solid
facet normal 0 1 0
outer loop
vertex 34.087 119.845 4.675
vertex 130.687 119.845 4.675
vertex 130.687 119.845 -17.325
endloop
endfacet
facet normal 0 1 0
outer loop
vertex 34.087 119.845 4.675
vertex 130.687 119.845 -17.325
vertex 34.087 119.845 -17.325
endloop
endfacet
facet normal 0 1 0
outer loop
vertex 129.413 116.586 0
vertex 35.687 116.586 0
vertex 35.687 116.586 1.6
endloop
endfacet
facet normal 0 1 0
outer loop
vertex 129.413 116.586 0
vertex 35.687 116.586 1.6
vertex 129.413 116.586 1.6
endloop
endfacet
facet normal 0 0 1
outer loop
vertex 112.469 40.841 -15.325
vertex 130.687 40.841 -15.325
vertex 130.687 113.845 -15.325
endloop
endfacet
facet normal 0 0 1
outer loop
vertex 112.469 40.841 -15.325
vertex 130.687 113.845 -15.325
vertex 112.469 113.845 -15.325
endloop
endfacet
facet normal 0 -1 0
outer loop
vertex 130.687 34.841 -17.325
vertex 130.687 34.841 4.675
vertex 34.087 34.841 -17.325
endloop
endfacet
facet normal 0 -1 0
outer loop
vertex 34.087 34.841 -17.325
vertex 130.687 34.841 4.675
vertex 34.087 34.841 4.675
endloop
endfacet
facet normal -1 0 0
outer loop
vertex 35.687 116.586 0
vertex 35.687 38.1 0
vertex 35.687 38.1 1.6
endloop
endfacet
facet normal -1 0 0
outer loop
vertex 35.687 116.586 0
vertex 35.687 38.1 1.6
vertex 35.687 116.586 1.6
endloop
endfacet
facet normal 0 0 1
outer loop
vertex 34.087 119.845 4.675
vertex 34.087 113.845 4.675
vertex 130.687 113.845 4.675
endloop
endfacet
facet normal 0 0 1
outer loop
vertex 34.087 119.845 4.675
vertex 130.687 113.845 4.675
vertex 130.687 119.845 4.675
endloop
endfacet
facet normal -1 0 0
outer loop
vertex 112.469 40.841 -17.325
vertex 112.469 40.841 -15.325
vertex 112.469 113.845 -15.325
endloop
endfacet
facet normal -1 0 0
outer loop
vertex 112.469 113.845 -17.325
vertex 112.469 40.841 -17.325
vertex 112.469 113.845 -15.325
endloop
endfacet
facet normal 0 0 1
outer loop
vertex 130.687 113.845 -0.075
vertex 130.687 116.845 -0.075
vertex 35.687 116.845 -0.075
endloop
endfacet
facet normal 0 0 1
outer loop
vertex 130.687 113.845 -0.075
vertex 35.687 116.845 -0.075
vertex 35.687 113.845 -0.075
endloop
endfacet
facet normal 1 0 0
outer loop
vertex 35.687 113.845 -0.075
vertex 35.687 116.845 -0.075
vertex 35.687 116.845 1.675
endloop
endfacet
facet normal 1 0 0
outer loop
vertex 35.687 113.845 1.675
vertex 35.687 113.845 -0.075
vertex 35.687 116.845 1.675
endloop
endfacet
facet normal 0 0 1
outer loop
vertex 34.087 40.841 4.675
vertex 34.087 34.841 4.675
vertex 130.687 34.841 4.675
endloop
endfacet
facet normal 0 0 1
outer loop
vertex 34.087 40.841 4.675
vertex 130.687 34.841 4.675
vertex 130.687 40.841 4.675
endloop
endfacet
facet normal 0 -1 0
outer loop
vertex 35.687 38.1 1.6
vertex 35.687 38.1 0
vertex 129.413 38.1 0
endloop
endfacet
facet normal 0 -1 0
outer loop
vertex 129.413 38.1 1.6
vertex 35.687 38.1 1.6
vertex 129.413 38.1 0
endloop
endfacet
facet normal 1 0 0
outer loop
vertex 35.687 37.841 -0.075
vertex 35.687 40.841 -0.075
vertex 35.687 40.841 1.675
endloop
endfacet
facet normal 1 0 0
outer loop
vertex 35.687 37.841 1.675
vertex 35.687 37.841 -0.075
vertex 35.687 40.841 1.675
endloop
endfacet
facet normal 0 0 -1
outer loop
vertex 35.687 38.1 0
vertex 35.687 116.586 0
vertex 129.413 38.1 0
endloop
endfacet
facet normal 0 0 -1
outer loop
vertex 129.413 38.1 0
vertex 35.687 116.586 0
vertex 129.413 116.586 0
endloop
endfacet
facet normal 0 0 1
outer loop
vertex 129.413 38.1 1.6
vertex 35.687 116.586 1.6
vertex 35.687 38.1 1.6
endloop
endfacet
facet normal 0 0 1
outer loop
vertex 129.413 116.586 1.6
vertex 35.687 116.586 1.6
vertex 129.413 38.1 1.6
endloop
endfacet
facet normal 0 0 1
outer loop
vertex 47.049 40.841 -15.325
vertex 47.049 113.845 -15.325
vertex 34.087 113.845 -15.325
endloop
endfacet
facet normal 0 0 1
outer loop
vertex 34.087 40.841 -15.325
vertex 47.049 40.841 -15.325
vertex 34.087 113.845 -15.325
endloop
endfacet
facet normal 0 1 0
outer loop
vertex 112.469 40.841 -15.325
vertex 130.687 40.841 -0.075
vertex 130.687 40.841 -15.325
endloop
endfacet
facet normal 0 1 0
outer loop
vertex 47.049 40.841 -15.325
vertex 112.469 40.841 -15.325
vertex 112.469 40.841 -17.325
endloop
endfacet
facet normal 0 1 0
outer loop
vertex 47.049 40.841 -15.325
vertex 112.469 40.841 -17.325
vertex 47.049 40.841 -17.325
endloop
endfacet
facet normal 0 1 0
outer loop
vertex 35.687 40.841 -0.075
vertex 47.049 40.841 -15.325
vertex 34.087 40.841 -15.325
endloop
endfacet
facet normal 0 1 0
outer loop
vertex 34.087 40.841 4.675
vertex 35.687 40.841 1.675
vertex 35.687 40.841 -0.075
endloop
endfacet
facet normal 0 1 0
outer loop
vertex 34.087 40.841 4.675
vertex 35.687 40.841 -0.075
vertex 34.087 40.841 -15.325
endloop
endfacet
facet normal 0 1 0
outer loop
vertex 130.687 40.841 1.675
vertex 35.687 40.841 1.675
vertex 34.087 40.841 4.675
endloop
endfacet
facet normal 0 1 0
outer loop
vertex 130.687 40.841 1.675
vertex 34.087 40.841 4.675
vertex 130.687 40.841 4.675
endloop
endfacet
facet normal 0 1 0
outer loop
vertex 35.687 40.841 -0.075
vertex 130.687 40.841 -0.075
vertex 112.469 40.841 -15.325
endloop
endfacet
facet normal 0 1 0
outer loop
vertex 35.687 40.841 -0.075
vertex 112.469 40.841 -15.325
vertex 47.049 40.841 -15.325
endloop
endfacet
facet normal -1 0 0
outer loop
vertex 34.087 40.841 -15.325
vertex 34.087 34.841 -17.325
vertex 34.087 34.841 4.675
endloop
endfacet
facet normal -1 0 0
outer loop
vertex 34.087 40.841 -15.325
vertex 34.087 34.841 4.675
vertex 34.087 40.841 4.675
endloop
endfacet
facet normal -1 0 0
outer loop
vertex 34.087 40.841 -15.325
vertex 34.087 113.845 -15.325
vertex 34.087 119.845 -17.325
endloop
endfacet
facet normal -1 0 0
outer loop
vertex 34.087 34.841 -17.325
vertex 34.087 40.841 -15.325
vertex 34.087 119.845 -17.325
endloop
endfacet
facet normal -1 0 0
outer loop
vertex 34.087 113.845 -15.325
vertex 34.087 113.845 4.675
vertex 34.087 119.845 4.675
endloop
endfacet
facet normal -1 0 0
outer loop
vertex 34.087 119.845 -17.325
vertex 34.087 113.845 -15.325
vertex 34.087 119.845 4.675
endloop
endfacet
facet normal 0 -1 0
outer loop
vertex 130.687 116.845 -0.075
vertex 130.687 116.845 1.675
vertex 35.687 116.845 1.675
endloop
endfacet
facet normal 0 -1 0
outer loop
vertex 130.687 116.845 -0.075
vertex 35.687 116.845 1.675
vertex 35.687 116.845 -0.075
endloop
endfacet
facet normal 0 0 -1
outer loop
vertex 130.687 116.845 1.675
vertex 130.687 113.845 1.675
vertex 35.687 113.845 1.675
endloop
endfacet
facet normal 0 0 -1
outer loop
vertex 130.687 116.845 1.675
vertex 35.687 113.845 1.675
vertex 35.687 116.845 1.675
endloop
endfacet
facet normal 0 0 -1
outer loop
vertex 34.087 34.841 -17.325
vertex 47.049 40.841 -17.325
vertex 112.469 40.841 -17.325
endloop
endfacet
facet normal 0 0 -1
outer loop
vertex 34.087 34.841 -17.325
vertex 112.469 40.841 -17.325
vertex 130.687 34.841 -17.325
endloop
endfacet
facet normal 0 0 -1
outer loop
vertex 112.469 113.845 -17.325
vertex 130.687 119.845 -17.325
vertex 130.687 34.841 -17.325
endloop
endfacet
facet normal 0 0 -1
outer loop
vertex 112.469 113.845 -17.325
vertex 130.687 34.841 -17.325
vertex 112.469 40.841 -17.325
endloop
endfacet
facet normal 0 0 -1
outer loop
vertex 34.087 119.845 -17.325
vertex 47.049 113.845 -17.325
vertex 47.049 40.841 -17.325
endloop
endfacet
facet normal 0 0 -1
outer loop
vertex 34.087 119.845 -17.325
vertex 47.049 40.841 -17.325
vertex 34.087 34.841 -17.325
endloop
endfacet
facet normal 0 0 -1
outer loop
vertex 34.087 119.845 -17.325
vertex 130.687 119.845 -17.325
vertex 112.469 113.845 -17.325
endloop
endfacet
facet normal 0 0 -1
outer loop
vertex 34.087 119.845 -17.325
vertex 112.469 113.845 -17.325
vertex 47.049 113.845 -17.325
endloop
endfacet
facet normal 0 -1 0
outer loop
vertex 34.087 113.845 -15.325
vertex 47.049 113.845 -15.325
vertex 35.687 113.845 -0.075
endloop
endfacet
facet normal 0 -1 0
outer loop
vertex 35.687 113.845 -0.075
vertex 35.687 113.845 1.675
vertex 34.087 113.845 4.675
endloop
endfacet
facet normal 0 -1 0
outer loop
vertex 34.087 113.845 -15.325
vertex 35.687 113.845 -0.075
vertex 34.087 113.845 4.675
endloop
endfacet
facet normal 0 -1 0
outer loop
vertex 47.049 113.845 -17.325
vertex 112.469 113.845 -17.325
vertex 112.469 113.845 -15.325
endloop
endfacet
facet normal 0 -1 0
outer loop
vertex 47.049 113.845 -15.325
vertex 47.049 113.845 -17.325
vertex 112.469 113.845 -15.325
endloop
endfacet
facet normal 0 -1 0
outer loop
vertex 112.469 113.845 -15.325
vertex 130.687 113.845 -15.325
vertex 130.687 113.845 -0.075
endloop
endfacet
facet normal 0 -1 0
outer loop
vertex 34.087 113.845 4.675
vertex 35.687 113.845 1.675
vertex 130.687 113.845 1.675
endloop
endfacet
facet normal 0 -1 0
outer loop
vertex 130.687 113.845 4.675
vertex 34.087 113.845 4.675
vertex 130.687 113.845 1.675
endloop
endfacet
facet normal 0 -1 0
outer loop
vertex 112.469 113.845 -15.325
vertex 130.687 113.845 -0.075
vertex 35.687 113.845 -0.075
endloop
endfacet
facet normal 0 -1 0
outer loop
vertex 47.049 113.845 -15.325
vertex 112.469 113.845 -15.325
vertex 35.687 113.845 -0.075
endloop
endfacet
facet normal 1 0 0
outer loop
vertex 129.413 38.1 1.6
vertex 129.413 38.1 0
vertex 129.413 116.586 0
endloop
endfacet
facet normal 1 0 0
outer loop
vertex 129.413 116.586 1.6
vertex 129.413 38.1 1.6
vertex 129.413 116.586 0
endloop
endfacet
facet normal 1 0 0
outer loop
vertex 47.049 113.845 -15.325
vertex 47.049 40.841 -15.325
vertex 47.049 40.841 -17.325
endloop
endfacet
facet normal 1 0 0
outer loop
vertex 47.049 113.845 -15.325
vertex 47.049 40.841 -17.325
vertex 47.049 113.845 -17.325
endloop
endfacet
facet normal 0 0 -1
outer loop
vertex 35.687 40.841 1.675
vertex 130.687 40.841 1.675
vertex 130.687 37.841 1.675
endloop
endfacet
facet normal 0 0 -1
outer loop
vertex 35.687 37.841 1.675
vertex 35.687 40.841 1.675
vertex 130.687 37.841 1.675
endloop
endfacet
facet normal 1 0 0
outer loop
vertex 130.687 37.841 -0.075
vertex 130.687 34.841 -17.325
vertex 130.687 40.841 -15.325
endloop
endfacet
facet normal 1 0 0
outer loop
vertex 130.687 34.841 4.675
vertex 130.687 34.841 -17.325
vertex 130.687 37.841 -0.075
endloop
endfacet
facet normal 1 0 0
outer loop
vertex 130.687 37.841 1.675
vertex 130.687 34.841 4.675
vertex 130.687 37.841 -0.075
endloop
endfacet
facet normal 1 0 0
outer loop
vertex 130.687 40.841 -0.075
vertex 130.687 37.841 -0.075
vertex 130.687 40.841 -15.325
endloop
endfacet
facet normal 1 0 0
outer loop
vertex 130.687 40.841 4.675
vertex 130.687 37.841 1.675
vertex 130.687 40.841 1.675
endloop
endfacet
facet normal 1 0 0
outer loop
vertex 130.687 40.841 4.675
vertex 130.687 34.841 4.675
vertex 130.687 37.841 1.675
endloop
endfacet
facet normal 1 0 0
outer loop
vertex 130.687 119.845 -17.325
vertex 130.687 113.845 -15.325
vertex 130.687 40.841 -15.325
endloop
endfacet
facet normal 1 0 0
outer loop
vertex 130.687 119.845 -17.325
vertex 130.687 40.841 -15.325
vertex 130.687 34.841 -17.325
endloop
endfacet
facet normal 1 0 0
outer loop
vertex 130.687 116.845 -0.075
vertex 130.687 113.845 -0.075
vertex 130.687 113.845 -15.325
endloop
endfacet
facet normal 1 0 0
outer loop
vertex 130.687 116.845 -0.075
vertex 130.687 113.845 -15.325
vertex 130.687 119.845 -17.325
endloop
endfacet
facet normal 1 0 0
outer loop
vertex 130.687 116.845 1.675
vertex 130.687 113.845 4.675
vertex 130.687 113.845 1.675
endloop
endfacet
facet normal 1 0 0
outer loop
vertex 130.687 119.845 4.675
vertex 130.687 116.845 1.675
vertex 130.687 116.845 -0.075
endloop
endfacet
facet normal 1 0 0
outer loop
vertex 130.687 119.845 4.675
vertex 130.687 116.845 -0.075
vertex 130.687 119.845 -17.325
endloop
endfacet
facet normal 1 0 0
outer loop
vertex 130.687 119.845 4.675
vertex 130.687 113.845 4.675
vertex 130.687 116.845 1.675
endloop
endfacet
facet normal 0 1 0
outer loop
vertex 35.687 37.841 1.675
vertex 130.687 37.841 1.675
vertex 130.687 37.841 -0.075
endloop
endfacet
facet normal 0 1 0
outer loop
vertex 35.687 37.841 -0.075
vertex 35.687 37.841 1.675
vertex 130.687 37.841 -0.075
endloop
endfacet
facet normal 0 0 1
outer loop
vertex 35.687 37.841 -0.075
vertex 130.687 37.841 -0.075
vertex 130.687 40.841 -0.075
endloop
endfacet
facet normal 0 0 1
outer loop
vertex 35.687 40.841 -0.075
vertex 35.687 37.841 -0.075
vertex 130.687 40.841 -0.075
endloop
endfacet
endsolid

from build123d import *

# Parameters (mm, degrees)
SKETCH4_W             = 93.726
SKETCH4_H             = 78.486
BOSS_EXTRUDE1_DEPTH   = 1.6
BOSS_EXTRUDE2_DEPTH   = 95
BOSS_EXTRUDE2_2_DEPTH = 95
SKETCH6_W             = 20
SKETCH6_H             = 6
BOSS_EXTRUDE3_DEPTH   = 1.6
SKETCH7_W             = 96.6
SKETCH7_H             = 85.004960342
SKETCH7_W_2           = 65.419983822
SKETCH7_H_2           = 73.004960342
BOSS_EXTRUDE4_DEPTH   = 2


with BuildPart() as part:
    # Sketch4 → Boss-Extrude1 (new body)
    with BuildSketch(Plane.XY):
        with Locations((82.55, 77.343)):
            Rectangle(SKETCH4_W, SKETCH4_H)
    extrude(amount=BOSS_EXTRUDE1_DEPTH)


with BuildPart() as body_2:
    # Sketch5 → Boss-Extrude2 (new body)
    with BuildSketch(Plane.ZY.offset(-35.687)):
        Polygon((-0.075, 113.845480171), (-15.325, 113.845480171), (-15.325, 119.845480171), (4.675, 119.845480171), (4.675, 113.845480171), (1.675, 113.845480171), (1.675, 116.845480171), (-0.075, 116.845480171), align=None)
    extrude(amount=-BOSS_EXTRUDE2_DEPTH)

    # Sketch6 → Boss-Extrude3 (add)
    with BuildSketch(Plane.ZY.offset(-35.687)):
        with Locations((-5.325, 116.845480171)):
            Rectangle(SKETCH6_W, SKETCH6_H)
        with Locations((-5.325, 37.840519829)):
            Rectangle(SKETCH6_W, SKETCH6_H)
    extrude(amount=BOSS_EXTRUDE3_DEPTH)


with BuildPart() as body_3:
    # Sketch5 → Boss-Extrude2 2 (new body)
    with BuildSketch(Plane.ZY.offset(-35.687)):
        Polygon((-0.075, 37.840519829), (-0.075, 40.840519829), (-15.325, 40.840519829), (-15.325, 34.840519829), (4.675, 34.840519829), (4.675, 40.840519829), (1.675, 40.840519829), (1.675, 37.840519829), align=None)
    extrude(amount=-BOSS_EXTRUDE2_2_DEPTH)


with BuildPart() as boss_extrude3_piece_1:
    # of the separate pieces the step leaves, piece 1, a body of its own (boss_extrude3_pieces)
    add(body_2.part.solids().sort_by_distance((35.687, 113.845480171, -0.075))[0])

    # Sketch7 → Boss-Extrude4 (add)
    with BuildSketch(Plane(origin=(0, 0, -15.325), x_dir=(-1, 0, 0), z_dir=(0, 0, -1))):
        with Locations((-82.387, 77.343)):
            Rectangle(SKETCH7_W, SKETCH7_H)
        with Locations((-79.759359545, 77.343)):
            Rectangle(SKETCH7_W_2, SKETCH7_H_2, mode=Mode.SUBTRACT)
    extrude(amount=BOSS_EXTRUDE4_DEPTH)


with BuildPart() as boss_extrude3_piece_2:
    # of the separate pieces the step leaves, piece 2, a body of its own (boss_extrude3_pieces)
    add(body_2.part.solids().sort_by_distance((35.687, 34.840519829, 4.675))[0])


with BuildPart() as body_3_1:
    add(body_3.part)

    # Combine1: union Boss-Extrude3 piece 2, Boss-Extrude3 piece 1
    add(boss_extrude3_piece_2.part)
    add(boss_extrude3_piece_1.part)


solid = Compound([part.part, body_3_1.part])
